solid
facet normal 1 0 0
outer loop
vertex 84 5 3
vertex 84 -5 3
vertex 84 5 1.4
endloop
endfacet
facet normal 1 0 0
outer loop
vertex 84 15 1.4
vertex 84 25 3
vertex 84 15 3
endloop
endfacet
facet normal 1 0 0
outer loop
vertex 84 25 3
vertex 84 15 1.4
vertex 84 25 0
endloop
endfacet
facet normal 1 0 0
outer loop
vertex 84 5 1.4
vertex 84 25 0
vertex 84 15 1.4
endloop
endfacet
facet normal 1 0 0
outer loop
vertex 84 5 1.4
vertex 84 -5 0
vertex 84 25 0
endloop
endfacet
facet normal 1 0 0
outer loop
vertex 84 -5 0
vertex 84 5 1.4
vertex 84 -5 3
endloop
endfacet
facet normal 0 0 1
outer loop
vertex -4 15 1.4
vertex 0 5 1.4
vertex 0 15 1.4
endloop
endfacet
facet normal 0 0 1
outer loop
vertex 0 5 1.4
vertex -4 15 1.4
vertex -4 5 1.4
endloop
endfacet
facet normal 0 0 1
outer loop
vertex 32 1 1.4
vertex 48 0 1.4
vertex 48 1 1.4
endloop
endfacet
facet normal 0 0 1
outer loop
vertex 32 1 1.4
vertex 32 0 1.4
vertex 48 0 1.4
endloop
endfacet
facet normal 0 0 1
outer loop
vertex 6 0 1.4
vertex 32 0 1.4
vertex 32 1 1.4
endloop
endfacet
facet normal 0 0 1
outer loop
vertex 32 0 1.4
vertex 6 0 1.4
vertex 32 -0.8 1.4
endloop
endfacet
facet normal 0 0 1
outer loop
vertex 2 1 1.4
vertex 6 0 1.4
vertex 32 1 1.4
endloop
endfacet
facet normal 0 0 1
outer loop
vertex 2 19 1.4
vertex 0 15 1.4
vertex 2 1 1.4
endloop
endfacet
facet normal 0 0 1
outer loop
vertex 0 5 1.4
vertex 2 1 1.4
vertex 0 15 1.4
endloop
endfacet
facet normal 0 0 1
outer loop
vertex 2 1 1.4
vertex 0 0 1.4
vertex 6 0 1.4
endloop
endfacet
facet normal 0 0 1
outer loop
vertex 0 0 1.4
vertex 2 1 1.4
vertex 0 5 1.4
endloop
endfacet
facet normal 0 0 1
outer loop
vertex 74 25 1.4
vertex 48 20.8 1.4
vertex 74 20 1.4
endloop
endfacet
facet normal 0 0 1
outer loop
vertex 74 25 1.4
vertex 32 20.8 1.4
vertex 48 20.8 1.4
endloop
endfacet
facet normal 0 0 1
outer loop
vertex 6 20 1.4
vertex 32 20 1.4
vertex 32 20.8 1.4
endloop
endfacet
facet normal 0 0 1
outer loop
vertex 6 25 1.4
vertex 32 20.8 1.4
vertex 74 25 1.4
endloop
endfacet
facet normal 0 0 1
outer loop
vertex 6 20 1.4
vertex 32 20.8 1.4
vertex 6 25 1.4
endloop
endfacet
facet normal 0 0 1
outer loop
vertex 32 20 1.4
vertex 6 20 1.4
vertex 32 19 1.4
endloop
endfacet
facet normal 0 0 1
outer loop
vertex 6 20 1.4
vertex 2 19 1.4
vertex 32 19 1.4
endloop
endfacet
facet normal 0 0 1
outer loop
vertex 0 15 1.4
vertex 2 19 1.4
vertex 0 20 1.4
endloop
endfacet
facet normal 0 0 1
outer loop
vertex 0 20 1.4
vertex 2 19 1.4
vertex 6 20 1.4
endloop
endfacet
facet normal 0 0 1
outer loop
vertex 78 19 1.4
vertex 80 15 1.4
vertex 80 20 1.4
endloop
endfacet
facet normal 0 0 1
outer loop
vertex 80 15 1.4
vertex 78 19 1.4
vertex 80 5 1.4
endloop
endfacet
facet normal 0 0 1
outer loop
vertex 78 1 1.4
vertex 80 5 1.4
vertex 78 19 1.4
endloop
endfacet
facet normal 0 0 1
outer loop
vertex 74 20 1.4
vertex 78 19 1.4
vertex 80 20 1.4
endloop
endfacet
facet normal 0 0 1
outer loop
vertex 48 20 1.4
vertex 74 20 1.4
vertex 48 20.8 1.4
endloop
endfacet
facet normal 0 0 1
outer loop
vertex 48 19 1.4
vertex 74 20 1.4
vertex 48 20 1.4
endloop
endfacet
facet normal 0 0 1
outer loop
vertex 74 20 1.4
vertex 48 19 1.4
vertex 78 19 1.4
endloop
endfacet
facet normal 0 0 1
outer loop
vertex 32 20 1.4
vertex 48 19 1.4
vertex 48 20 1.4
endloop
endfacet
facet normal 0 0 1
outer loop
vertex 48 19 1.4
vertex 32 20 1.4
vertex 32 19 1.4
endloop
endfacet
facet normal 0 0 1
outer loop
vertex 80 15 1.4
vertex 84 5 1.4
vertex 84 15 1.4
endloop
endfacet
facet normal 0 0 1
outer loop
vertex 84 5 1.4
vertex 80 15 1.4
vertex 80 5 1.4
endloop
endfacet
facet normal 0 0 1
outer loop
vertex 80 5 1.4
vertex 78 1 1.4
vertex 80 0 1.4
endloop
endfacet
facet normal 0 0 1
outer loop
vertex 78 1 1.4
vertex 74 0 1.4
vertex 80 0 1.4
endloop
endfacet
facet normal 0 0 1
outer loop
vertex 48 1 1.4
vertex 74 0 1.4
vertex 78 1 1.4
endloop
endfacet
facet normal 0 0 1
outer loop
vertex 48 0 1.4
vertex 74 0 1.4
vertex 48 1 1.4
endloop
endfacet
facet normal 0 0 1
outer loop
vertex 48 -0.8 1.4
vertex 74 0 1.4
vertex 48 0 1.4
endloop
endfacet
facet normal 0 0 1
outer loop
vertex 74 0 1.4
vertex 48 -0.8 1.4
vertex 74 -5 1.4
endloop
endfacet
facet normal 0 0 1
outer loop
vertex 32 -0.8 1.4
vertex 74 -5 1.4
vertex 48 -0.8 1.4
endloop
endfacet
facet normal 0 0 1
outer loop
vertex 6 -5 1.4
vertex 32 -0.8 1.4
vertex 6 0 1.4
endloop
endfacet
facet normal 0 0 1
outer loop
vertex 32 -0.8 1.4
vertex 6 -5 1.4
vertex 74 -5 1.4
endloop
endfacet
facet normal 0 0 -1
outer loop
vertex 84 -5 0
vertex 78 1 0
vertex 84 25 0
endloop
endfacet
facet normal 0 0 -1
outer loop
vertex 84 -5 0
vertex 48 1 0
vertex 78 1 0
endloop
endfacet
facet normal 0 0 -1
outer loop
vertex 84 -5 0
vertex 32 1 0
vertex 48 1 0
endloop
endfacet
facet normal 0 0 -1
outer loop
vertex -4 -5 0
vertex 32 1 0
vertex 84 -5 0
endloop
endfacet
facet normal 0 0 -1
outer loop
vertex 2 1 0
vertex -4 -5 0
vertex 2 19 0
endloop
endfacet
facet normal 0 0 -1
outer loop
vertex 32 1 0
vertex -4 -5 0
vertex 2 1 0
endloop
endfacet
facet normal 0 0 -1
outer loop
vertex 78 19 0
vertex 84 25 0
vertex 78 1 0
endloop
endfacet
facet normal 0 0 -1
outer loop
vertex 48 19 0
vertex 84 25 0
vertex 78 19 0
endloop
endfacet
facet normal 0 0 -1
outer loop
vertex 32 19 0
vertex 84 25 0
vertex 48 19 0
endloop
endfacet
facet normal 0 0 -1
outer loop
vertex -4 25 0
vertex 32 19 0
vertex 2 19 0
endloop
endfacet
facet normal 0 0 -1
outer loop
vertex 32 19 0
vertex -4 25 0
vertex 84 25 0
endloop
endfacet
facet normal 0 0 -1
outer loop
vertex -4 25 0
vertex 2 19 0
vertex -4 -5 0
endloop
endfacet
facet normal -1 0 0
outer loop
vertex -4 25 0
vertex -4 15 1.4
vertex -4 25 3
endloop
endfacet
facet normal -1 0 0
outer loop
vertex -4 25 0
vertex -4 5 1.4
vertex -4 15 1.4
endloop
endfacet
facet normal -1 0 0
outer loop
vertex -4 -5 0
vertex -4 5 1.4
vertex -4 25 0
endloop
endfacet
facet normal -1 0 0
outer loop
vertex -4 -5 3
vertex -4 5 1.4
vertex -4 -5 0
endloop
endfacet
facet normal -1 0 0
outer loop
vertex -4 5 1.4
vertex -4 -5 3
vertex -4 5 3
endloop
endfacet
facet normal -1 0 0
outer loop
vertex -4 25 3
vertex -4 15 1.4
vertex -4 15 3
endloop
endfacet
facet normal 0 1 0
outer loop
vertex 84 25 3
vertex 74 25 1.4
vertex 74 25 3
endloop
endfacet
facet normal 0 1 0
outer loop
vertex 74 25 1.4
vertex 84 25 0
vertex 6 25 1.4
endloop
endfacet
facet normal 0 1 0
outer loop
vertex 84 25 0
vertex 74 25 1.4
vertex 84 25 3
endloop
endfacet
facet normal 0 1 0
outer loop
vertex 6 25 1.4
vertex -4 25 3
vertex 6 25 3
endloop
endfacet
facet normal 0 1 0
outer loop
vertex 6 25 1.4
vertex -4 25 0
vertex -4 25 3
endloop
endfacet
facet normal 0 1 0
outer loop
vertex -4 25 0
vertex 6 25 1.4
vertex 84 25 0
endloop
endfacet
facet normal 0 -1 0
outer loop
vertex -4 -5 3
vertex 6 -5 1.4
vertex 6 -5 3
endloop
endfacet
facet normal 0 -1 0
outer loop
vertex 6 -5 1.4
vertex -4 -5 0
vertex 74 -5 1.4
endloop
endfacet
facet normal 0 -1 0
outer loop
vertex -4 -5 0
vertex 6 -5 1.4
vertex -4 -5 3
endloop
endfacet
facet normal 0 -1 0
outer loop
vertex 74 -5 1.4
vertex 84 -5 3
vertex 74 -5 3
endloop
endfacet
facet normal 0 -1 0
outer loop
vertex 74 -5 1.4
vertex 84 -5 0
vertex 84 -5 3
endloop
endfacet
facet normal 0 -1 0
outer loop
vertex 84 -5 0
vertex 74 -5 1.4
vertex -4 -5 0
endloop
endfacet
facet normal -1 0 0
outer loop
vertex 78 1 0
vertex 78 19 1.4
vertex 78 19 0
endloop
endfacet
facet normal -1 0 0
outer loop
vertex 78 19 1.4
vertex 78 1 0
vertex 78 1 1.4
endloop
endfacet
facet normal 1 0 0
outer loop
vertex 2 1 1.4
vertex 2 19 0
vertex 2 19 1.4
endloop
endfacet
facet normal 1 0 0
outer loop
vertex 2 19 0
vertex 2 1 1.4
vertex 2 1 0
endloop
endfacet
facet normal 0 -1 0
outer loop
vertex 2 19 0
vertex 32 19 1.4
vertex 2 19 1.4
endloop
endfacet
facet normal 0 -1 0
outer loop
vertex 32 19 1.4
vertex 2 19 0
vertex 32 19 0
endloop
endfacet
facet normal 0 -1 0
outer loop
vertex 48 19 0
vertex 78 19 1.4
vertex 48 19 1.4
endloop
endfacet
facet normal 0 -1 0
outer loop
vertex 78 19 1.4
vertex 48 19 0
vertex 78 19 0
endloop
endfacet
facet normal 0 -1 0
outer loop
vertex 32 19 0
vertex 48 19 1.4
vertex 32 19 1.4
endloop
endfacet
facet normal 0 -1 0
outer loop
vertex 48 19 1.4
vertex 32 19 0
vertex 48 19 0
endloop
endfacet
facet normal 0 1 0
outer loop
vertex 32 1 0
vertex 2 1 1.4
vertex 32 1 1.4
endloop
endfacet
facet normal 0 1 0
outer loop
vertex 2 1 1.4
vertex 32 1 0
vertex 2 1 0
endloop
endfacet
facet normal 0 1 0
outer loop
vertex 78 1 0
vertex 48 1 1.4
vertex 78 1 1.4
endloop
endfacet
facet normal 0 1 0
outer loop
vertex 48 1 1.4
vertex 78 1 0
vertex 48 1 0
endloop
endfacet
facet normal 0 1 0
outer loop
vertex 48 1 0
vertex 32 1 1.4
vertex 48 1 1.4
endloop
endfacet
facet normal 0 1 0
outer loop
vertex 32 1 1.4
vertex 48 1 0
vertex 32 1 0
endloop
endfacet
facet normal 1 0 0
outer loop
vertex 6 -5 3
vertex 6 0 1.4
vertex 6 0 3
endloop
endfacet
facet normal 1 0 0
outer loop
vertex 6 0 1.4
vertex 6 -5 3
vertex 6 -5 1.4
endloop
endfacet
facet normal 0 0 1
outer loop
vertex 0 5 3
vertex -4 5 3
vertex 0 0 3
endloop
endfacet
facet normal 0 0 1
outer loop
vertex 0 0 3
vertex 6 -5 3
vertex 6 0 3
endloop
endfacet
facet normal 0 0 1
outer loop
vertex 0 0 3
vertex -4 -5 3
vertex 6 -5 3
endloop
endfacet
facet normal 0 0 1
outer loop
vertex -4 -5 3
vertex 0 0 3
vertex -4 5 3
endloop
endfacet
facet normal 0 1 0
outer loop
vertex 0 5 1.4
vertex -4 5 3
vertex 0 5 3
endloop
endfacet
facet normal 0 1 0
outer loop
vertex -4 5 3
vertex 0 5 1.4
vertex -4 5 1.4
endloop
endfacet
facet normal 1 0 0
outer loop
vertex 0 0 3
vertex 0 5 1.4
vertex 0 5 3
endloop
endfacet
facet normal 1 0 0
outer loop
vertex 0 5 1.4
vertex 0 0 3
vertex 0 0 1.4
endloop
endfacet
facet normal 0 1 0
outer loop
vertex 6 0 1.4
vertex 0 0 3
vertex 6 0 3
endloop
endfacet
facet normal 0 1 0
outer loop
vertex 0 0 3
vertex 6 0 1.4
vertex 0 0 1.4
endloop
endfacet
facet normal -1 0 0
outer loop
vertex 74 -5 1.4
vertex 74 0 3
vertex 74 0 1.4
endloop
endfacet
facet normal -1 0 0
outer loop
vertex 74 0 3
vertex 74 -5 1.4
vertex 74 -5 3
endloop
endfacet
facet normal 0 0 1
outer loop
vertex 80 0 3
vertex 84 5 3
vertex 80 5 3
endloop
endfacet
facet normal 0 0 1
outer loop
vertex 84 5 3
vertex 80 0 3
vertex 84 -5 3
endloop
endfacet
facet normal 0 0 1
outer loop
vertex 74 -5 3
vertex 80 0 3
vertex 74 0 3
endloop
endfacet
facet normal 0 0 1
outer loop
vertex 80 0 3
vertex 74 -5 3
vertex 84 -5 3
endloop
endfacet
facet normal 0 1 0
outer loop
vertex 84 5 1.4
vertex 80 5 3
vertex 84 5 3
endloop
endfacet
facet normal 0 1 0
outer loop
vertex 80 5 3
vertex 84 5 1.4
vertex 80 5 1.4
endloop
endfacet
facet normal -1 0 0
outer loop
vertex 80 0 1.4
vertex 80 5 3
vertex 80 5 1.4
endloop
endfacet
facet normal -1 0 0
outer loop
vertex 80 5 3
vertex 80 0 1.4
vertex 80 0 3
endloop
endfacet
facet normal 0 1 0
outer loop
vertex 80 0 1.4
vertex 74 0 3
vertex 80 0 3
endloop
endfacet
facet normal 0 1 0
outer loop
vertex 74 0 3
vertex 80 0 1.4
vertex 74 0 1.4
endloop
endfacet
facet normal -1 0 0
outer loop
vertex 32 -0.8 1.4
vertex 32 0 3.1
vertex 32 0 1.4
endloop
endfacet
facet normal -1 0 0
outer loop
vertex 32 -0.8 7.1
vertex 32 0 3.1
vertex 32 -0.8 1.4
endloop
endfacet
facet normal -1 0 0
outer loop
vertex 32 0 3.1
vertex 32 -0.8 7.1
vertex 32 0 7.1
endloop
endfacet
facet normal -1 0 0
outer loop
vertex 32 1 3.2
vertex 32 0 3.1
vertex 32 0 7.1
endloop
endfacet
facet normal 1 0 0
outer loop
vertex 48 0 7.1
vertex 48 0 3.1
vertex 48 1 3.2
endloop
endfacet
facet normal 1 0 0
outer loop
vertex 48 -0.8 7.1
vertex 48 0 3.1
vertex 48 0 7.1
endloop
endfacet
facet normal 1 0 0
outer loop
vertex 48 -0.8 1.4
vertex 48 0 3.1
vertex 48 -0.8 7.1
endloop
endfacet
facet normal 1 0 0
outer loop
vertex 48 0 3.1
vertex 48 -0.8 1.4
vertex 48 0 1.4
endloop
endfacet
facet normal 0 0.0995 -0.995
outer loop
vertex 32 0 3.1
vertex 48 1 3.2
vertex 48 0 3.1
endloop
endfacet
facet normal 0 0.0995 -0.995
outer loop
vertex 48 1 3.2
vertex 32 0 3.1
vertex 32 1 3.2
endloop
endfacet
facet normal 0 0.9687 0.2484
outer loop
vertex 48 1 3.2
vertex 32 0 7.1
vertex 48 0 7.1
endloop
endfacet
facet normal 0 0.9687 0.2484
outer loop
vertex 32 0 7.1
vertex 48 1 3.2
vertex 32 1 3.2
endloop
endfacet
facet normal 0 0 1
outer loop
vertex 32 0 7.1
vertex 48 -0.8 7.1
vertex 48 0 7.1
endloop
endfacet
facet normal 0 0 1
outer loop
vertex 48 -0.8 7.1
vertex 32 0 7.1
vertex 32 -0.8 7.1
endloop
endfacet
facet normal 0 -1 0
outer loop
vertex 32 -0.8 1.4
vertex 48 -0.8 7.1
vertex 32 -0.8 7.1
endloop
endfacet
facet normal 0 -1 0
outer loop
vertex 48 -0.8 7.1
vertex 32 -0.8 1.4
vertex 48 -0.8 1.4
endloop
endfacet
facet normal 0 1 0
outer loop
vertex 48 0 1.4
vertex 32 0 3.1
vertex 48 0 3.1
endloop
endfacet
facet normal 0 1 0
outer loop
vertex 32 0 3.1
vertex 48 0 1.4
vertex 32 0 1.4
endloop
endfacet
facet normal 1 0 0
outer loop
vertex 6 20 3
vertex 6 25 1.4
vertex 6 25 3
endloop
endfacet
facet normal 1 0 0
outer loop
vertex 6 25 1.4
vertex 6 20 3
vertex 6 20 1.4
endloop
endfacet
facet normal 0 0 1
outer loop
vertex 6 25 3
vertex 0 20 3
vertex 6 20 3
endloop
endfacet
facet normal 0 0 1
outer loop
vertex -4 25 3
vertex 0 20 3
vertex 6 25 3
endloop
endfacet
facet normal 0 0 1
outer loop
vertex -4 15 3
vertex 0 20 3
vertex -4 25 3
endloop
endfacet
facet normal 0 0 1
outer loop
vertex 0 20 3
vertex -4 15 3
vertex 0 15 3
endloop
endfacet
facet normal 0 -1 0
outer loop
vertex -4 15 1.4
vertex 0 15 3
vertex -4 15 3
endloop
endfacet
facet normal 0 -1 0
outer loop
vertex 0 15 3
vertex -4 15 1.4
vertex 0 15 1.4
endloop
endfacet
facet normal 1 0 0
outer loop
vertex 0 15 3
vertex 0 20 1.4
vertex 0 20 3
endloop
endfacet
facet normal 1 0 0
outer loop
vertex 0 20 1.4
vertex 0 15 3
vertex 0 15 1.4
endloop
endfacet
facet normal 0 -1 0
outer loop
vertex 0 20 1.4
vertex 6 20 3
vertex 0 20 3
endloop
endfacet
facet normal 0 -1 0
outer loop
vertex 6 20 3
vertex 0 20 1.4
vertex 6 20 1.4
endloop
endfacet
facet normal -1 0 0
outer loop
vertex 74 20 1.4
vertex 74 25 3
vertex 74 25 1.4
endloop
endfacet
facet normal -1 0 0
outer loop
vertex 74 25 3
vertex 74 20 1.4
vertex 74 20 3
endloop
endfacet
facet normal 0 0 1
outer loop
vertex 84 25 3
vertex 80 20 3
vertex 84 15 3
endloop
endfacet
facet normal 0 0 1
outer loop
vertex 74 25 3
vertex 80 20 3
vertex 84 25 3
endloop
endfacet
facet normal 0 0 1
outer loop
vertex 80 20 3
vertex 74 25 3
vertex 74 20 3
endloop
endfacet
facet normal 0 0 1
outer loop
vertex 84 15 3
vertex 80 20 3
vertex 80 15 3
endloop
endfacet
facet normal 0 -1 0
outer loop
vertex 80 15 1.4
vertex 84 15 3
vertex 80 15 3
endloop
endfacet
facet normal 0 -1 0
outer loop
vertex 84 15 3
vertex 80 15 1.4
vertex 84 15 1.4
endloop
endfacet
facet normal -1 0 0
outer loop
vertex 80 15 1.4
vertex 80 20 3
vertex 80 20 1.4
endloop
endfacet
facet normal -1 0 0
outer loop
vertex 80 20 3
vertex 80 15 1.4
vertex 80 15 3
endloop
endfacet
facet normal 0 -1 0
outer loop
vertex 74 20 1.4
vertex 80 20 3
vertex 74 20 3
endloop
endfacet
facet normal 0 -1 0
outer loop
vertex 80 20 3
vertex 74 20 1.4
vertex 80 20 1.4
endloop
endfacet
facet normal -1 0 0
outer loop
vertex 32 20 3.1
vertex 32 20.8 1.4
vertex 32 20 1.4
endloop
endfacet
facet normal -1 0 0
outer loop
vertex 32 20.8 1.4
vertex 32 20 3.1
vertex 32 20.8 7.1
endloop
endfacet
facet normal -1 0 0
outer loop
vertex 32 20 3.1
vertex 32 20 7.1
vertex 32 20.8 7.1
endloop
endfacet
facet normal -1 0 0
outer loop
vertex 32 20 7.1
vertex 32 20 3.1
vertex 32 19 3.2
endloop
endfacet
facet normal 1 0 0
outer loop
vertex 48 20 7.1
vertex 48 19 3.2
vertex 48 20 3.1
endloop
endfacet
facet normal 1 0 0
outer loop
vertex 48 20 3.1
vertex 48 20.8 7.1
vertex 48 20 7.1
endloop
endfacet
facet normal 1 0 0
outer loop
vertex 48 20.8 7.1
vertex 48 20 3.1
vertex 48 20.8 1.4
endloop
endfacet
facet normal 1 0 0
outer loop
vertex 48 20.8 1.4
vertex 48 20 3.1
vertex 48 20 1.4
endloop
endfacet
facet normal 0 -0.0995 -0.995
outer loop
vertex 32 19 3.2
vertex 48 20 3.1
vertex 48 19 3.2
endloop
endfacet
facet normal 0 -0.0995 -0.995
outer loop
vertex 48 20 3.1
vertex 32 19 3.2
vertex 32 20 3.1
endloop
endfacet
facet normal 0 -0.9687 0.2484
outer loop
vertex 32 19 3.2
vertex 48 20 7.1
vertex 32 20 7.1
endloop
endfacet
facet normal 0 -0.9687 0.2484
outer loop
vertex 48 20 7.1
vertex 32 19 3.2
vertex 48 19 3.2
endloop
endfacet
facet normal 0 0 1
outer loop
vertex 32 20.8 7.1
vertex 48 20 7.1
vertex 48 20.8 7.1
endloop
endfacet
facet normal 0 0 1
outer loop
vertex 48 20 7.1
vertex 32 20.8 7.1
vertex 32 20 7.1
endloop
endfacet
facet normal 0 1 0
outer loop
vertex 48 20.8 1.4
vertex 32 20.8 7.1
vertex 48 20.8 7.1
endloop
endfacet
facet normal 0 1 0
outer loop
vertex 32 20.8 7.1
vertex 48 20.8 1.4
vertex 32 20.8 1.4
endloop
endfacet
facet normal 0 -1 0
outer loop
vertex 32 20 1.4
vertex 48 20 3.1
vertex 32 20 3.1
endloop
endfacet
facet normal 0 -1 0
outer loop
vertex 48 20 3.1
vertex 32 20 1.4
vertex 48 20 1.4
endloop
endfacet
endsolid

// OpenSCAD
coinLargeur=6;
coinLongueur=10;

coteLongueur=16;
coteLargeur=6;

epaisseurPcb=1.6;

margePcbLongueur=2;
margePcbLargeur=1;

hauteurClip=4;
epaisseurClip=0.8;

//un cote support = un coin. un cote. et un autre coin en mirroir X
module supportUnCotePcb(longueurPcb, largeurPcb, doCotes=true, useClips=true, hauteurSupport=6){
	
	translate([-(coinLargeur-margePcbLongueur),-(coinLargeur-margePcbLargeur),0])
		coin(hauteurSupport=hauteurSupport);
	
	translate([longueurPcb,0,0])
		mirror([1,0,0])
			translate([-(coinLargeur-margePcbLongueur),-(coinLargeur-margePcbLargeur),0])
				coin(hauteurSupport=hauteurSupport);
	if(doCotes){
		translate([(longueurPcb/2)-(coteLongueur/2),-(coteLargeur-margePcbLargeur),0])
			cote(useClips=useClips, hauteurSupport=hauteurSupport);
	}
}

//support = deux cotes supports en mirroir Y
module supportPcb(longueurPcb, largeurPcb, hauteurSupport=6, doCotes=true, useClips=true){
	
	supportUnCotePcb(longueurPcb=longueurPcb,largeurPcb=largeurPcb,doCotes=doCotes,useClips=useClips,hauteurSupport=hauteurSupport);
	
	translate([0,largeurPcb,0])
		mirror([0,1,0])
			supportUnCotePcb(longueurPcb=longueurPcb,largeurPcb=largeurPcb,doCotes=doCotes,useClips=useClips,hauteurSupport=hauteurSupport);
}

module coin(){
	difference(){
		cube([coinLongueur, coinLongueur, hauteurSupport]);
		translate([coinLargeur,coinLargeur,-.1])
			cube([coinLongueur, coinLongueur, hauteurSupport+.2]);
		translate([coinLargeur-margePcbLongueur,coinLargeur-margePcbLargeur,hauteurSupport-epaisseurPcb])
			cube([coinLongueur, coinLongueur, hauteurSupport+.1]);
	}
	
}

module clip(epaisseurPcb=1.6,margePcb=1){
	polygon([
		[0,0],
		[epaisseurClip,0],
		[epaisseurClip,epaisseurPcb+.1],
		[epaisseurClip+margePcb,epaisseurPcb+.2],
		[epaisseurClip,epaisseurPcb+.1+hauteurClip],
		[0,epaisseurPcb+.1+hauteurClip],
	]);
}

module cote(useClips=true, hauteurSupport=6){
	
	if(useClips) {
		
		translate([0,coteLargeur-epaisseurClip-margePcbLargeur,hauteurSupport-epaisseurPcb])
			rotate(90,[1,0,0]) 
				rotate(90,[0,1,0])
					linear_extrude(height=coteLongueur)
						 clip();

		cube([coteLongueur, coteLargeur, hauteurSupport-epaisseurPcb]);
		
	}
	else {
		difference(){
			cube([coteLongueur, coteLargeur, hauteurSupport]);
			translate([-.1,coteLargeur-margePcbLargeur, hauteurSupport-epaisseurPcb])
				cube([coteLongueur+.2, coteLargeur, epaisseurPcb+.1]);
		}
	}
	
}

module test_7x5(){
	translate([-4,-5,-3])
		cube([78,60,3]);
	supportPcb(longueurPcb=70,largeurPcb=50, doCotes=true, useClips=true);
}

module test_8x2(){
	difference(){
		translate([-4,-5,0])
			cube([88,30,1.4]);
		translate([2,1,-0.2])
			cube([76,18,1.8]);
	}
	supportPcb(longueurPcb=80,largeurPcb=20, doCotes=true, useClips=true, hauteurSupport=3);
}

//test_7x5();
test_8x2();
